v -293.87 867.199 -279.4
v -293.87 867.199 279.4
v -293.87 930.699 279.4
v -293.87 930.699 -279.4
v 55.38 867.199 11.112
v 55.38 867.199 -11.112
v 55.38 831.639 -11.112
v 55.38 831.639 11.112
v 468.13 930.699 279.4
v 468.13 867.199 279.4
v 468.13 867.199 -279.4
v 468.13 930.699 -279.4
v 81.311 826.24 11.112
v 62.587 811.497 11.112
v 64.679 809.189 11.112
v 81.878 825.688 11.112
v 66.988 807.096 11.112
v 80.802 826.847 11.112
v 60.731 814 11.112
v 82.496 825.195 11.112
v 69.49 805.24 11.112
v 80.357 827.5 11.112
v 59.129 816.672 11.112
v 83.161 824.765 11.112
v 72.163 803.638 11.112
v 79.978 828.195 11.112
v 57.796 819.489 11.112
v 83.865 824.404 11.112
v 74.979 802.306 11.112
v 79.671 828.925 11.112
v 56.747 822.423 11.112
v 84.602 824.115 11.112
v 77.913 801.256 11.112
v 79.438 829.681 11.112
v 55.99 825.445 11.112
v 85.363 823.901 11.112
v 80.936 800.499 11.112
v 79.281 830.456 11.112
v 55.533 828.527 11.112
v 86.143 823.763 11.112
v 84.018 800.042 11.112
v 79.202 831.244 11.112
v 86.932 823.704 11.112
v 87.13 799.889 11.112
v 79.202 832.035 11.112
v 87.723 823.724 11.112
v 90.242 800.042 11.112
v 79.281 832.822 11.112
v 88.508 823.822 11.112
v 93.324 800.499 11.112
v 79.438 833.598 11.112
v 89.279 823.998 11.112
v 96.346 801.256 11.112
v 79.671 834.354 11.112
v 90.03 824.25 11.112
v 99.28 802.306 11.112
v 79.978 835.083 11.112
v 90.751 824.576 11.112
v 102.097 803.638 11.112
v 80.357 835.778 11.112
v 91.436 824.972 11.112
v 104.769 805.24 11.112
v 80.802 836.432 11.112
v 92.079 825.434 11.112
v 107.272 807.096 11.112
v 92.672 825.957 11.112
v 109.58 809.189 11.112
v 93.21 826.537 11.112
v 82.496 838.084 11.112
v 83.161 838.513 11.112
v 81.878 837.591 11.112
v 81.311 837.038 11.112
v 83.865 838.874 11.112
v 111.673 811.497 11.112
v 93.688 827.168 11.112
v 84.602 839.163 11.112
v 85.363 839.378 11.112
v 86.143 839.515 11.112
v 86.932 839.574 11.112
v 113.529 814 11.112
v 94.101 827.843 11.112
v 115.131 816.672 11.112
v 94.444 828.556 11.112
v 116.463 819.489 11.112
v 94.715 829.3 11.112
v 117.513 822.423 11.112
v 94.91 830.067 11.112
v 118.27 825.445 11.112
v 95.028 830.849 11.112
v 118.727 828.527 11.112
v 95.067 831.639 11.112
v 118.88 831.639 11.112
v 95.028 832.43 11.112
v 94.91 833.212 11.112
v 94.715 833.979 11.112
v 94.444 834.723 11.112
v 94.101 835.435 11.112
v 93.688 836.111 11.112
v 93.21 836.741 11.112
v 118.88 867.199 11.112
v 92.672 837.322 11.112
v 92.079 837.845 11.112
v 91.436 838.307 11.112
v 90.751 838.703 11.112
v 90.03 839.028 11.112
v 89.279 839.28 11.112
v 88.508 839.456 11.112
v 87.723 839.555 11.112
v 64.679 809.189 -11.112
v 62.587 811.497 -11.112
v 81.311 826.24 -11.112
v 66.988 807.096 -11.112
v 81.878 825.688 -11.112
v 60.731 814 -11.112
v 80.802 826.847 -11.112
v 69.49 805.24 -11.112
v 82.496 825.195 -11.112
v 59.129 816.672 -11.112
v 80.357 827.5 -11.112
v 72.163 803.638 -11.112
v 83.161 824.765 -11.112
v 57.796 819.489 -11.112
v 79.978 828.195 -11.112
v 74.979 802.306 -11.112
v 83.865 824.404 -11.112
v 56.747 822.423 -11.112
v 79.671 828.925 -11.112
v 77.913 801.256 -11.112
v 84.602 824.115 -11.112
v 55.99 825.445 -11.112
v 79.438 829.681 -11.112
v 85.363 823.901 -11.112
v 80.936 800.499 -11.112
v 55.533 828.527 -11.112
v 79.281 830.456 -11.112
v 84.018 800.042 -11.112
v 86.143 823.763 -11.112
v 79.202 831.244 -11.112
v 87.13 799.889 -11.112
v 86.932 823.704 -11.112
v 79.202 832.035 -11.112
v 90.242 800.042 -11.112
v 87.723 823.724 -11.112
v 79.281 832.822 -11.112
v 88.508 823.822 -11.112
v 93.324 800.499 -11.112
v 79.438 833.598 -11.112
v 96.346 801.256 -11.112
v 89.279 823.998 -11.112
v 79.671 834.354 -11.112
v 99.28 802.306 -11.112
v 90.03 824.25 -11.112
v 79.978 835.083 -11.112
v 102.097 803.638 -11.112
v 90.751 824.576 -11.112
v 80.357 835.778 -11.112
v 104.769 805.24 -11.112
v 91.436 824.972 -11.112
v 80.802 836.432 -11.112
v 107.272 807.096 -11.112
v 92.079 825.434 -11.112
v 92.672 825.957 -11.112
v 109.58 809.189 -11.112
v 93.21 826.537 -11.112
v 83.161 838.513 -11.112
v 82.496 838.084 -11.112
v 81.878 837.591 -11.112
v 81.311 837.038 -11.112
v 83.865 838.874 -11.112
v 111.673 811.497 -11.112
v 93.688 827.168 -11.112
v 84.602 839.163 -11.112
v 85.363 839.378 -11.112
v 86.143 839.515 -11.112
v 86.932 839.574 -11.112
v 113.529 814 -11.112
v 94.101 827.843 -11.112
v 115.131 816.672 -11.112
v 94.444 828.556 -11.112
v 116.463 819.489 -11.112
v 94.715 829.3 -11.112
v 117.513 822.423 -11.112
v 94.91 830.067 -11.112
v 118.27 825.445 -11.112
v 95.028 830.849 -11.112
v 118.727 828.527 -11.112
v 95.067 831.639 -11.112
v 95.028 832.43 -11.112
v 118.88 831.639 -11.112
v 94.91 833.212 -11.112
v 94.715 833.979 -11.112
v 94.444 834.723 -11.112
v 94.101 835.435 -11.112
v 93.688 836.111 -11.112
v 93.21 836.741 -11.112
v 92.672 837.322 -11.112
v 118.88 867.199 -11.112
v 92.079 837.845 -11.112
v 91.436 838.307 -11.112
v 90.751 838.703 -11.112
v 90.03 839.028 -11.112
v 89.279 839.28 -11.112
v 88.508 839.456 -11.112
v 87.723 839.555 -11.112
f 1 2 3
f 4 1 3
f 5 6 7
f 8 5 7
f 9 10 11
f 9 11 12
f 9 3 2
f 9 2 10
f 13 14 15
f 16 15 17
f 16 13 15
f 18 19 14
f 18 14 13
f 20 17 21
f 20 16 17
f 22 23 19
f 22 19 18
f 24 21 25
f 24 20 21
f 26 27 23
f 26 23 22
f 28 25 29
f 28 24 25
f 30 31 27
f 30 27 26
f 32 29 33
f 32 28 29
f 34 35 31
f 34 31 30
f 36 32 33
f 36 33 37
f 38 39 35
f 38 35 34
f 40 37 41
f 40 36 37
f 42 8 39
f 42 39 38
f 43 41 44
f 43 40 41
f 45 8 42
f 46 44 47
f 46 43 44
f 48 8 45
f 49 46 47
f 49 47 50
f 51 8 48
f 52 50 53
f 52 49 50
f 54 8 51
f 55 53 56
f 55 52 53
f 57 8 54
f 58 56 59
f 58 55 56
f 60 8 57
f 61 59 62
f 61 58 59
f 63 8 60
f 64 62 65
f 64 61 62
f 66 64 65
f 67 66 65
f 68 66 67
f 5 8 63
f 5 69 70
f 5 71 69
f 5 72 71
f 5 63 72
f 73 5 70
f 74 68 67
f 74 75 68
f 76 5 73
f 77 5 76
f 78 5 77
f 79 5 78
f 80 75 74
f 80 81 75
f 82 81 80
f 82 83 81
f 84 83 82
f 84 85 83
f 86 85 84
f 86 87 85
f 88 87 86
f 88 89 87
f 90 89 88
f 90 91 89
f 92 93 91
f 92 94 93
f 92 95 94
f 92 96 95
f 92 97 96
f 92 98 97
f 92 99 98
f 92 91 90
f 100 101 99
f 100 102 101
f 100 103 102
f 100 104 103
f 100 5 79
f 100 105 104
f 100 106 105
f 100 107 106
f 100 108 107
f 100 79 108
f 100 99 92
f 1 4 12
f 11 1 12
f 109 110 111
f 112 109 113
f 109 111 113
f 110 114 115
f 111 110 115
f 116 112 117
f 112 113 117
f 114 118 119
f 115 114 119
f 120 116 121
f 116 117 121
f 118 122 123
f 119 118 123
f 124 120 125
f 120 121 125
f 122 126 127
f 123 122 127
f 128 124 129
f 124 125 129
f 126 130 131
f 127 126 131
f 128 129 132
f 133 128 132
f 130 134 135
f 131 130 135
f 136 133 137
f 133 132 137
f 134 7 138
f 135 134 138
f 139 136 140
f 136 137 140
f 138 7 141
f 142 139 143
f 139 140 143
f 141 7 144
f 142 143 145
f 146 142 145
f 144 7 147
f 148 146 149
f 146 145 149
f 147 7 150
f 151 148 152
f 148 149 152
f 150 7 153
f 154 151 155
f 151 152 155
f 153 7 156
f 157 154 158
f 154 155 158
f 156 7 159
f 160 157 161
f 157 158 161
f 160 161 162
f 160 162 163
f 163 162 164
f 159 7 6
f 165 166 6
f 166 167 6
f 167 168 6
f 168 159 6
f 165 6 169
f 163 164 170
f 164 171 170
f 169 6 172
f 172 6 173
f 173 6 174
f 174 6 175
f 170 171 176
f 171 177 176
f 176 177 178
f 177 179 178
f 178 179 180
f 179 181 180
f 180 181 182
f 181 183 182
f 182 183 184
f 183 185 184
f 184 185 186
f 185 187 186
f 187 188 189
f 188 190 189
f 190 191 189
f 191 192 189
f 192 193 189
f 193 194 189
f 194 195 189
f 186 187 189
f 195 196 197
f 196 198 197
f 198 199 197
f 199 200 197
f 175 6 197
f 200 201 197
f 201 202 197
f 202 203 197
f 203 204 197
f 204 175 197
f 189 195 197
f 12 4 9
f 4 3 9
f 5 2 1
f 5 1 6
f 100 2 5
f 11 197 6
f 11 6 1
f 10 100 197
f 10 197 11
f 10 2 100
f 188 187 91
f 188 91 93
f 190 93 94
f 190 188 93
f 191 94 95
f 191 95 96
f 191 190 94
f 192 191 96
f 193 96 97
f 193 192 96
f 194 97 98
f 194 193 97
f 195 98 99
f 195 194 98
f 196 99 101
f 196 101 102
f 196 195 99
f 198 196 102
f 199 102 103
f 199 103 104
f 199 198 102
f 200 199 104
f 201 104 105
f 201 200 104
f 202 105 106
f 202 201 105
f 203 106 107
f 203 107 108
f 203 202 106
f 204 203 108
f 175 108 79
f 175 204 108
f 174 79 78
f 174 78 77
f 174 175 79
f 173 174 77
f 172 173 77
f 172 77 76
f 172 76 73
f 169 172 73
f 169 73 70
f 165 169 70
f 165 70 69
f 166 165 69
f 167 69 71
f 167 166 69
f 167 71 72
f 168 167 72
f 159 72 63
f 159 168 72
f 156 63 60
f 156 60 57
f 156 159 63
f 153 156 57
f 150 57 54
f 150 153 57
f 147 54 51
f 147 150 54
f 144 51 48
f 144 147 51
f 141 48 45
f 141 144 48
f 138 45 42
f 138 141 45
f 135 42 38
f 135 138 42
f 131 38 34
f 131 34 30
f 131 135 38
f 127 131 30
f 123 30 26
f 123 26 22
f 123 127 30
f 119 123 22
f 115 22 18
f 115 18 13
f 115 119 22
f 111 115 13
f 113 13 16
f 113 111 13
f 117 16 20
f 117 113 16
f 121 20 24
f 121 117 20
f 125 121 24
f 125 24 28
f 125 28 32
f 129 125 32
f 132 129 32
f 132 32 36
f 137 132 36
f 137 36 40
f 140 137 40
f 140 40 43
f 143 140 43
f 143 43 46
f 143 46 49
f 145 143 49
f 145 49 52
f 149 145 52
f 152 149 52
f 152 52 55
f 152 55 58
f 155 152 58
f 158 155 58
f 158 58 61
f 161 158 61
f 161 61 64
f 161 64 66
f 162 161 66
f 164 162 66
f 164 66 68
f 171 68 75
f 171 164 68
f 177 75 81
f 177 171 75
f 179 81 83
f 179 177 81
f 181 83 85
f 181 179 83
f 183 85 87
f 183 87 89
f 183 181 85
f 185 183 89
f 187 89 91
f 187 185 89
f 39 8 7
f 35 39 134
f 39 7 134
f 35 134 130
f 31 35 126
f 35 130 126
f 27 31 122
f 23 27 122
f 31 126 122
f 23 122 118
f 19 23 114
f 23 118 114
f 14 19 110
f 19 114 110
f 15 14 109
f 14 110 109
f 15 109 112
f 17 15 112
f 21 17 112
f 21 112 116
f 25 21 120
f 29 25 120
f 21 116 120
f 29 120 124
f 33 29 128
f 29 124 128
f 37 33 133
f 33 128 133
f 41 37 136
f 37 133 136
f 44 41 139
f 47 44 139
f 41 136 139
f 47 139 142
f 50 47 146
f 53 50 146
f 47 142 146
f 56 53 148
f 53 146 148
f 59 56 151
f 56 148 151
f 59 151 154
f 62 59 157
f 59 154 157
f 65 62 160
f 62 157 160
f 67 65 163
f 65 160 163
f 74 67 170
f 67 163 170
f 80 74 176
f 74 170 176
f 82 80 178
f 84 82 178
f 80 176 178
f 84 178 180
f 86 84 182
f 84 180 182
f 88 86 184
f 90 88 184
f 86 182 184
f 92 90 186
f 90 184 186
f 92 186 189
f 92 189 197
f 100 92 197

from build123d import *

# Parameters (mm, degrees)
EXTRUDE2_START     = -11.1125
EXTRUDE2_OUTLINE_R = 7.9375
EXTRUDE2_DEPTH     = 22.225
SKETCH2_W          = 762
SKETCH2_H          = 63.5
EXTRUDE3_DEPTH     = 279.4


# Read off the part's stored shape, not the designer's step: Extrude2
with BuildPart() as part:
    # Extrude2 outline → Extrude2 (new body)
    with BuildSketch(Plane.XY.offset(EXTRUDE2_START)):
        with BuildLine():
            ThreePointArc((55.379666285, 831.639308698), (87.129666285, 799.889308698), (118.879666285, 831.639308698))
            Line((118.879666285, 831.639308698), (118.879666285, 867.199308698))
            Line((118.879666285, 867.199308698), (55.379666285, 867.199308698))
            Line((55.379666285, 867.199308698), (55.379666285, 831.639308698))
        make_face()
        with Locations((87.129666285, 831.639308698)):
            Circle(EXTRUDE2_OUTLINE_R, mode=Mode.SUBTRACT)
    extrude(amount=EXTRUDE2_DEPTH)

    # Sketch2 → Extrude3 (add, symmetric)
    with BuildSketch(Plane.XY):
        with Locations((87.129666285, 898.949308698)):
            Rectangle(SKETCH2_W, SKETCH2_H)
    extrude(amount=EXTRUDE3_DEPTH, both=True)


solid = part.part
